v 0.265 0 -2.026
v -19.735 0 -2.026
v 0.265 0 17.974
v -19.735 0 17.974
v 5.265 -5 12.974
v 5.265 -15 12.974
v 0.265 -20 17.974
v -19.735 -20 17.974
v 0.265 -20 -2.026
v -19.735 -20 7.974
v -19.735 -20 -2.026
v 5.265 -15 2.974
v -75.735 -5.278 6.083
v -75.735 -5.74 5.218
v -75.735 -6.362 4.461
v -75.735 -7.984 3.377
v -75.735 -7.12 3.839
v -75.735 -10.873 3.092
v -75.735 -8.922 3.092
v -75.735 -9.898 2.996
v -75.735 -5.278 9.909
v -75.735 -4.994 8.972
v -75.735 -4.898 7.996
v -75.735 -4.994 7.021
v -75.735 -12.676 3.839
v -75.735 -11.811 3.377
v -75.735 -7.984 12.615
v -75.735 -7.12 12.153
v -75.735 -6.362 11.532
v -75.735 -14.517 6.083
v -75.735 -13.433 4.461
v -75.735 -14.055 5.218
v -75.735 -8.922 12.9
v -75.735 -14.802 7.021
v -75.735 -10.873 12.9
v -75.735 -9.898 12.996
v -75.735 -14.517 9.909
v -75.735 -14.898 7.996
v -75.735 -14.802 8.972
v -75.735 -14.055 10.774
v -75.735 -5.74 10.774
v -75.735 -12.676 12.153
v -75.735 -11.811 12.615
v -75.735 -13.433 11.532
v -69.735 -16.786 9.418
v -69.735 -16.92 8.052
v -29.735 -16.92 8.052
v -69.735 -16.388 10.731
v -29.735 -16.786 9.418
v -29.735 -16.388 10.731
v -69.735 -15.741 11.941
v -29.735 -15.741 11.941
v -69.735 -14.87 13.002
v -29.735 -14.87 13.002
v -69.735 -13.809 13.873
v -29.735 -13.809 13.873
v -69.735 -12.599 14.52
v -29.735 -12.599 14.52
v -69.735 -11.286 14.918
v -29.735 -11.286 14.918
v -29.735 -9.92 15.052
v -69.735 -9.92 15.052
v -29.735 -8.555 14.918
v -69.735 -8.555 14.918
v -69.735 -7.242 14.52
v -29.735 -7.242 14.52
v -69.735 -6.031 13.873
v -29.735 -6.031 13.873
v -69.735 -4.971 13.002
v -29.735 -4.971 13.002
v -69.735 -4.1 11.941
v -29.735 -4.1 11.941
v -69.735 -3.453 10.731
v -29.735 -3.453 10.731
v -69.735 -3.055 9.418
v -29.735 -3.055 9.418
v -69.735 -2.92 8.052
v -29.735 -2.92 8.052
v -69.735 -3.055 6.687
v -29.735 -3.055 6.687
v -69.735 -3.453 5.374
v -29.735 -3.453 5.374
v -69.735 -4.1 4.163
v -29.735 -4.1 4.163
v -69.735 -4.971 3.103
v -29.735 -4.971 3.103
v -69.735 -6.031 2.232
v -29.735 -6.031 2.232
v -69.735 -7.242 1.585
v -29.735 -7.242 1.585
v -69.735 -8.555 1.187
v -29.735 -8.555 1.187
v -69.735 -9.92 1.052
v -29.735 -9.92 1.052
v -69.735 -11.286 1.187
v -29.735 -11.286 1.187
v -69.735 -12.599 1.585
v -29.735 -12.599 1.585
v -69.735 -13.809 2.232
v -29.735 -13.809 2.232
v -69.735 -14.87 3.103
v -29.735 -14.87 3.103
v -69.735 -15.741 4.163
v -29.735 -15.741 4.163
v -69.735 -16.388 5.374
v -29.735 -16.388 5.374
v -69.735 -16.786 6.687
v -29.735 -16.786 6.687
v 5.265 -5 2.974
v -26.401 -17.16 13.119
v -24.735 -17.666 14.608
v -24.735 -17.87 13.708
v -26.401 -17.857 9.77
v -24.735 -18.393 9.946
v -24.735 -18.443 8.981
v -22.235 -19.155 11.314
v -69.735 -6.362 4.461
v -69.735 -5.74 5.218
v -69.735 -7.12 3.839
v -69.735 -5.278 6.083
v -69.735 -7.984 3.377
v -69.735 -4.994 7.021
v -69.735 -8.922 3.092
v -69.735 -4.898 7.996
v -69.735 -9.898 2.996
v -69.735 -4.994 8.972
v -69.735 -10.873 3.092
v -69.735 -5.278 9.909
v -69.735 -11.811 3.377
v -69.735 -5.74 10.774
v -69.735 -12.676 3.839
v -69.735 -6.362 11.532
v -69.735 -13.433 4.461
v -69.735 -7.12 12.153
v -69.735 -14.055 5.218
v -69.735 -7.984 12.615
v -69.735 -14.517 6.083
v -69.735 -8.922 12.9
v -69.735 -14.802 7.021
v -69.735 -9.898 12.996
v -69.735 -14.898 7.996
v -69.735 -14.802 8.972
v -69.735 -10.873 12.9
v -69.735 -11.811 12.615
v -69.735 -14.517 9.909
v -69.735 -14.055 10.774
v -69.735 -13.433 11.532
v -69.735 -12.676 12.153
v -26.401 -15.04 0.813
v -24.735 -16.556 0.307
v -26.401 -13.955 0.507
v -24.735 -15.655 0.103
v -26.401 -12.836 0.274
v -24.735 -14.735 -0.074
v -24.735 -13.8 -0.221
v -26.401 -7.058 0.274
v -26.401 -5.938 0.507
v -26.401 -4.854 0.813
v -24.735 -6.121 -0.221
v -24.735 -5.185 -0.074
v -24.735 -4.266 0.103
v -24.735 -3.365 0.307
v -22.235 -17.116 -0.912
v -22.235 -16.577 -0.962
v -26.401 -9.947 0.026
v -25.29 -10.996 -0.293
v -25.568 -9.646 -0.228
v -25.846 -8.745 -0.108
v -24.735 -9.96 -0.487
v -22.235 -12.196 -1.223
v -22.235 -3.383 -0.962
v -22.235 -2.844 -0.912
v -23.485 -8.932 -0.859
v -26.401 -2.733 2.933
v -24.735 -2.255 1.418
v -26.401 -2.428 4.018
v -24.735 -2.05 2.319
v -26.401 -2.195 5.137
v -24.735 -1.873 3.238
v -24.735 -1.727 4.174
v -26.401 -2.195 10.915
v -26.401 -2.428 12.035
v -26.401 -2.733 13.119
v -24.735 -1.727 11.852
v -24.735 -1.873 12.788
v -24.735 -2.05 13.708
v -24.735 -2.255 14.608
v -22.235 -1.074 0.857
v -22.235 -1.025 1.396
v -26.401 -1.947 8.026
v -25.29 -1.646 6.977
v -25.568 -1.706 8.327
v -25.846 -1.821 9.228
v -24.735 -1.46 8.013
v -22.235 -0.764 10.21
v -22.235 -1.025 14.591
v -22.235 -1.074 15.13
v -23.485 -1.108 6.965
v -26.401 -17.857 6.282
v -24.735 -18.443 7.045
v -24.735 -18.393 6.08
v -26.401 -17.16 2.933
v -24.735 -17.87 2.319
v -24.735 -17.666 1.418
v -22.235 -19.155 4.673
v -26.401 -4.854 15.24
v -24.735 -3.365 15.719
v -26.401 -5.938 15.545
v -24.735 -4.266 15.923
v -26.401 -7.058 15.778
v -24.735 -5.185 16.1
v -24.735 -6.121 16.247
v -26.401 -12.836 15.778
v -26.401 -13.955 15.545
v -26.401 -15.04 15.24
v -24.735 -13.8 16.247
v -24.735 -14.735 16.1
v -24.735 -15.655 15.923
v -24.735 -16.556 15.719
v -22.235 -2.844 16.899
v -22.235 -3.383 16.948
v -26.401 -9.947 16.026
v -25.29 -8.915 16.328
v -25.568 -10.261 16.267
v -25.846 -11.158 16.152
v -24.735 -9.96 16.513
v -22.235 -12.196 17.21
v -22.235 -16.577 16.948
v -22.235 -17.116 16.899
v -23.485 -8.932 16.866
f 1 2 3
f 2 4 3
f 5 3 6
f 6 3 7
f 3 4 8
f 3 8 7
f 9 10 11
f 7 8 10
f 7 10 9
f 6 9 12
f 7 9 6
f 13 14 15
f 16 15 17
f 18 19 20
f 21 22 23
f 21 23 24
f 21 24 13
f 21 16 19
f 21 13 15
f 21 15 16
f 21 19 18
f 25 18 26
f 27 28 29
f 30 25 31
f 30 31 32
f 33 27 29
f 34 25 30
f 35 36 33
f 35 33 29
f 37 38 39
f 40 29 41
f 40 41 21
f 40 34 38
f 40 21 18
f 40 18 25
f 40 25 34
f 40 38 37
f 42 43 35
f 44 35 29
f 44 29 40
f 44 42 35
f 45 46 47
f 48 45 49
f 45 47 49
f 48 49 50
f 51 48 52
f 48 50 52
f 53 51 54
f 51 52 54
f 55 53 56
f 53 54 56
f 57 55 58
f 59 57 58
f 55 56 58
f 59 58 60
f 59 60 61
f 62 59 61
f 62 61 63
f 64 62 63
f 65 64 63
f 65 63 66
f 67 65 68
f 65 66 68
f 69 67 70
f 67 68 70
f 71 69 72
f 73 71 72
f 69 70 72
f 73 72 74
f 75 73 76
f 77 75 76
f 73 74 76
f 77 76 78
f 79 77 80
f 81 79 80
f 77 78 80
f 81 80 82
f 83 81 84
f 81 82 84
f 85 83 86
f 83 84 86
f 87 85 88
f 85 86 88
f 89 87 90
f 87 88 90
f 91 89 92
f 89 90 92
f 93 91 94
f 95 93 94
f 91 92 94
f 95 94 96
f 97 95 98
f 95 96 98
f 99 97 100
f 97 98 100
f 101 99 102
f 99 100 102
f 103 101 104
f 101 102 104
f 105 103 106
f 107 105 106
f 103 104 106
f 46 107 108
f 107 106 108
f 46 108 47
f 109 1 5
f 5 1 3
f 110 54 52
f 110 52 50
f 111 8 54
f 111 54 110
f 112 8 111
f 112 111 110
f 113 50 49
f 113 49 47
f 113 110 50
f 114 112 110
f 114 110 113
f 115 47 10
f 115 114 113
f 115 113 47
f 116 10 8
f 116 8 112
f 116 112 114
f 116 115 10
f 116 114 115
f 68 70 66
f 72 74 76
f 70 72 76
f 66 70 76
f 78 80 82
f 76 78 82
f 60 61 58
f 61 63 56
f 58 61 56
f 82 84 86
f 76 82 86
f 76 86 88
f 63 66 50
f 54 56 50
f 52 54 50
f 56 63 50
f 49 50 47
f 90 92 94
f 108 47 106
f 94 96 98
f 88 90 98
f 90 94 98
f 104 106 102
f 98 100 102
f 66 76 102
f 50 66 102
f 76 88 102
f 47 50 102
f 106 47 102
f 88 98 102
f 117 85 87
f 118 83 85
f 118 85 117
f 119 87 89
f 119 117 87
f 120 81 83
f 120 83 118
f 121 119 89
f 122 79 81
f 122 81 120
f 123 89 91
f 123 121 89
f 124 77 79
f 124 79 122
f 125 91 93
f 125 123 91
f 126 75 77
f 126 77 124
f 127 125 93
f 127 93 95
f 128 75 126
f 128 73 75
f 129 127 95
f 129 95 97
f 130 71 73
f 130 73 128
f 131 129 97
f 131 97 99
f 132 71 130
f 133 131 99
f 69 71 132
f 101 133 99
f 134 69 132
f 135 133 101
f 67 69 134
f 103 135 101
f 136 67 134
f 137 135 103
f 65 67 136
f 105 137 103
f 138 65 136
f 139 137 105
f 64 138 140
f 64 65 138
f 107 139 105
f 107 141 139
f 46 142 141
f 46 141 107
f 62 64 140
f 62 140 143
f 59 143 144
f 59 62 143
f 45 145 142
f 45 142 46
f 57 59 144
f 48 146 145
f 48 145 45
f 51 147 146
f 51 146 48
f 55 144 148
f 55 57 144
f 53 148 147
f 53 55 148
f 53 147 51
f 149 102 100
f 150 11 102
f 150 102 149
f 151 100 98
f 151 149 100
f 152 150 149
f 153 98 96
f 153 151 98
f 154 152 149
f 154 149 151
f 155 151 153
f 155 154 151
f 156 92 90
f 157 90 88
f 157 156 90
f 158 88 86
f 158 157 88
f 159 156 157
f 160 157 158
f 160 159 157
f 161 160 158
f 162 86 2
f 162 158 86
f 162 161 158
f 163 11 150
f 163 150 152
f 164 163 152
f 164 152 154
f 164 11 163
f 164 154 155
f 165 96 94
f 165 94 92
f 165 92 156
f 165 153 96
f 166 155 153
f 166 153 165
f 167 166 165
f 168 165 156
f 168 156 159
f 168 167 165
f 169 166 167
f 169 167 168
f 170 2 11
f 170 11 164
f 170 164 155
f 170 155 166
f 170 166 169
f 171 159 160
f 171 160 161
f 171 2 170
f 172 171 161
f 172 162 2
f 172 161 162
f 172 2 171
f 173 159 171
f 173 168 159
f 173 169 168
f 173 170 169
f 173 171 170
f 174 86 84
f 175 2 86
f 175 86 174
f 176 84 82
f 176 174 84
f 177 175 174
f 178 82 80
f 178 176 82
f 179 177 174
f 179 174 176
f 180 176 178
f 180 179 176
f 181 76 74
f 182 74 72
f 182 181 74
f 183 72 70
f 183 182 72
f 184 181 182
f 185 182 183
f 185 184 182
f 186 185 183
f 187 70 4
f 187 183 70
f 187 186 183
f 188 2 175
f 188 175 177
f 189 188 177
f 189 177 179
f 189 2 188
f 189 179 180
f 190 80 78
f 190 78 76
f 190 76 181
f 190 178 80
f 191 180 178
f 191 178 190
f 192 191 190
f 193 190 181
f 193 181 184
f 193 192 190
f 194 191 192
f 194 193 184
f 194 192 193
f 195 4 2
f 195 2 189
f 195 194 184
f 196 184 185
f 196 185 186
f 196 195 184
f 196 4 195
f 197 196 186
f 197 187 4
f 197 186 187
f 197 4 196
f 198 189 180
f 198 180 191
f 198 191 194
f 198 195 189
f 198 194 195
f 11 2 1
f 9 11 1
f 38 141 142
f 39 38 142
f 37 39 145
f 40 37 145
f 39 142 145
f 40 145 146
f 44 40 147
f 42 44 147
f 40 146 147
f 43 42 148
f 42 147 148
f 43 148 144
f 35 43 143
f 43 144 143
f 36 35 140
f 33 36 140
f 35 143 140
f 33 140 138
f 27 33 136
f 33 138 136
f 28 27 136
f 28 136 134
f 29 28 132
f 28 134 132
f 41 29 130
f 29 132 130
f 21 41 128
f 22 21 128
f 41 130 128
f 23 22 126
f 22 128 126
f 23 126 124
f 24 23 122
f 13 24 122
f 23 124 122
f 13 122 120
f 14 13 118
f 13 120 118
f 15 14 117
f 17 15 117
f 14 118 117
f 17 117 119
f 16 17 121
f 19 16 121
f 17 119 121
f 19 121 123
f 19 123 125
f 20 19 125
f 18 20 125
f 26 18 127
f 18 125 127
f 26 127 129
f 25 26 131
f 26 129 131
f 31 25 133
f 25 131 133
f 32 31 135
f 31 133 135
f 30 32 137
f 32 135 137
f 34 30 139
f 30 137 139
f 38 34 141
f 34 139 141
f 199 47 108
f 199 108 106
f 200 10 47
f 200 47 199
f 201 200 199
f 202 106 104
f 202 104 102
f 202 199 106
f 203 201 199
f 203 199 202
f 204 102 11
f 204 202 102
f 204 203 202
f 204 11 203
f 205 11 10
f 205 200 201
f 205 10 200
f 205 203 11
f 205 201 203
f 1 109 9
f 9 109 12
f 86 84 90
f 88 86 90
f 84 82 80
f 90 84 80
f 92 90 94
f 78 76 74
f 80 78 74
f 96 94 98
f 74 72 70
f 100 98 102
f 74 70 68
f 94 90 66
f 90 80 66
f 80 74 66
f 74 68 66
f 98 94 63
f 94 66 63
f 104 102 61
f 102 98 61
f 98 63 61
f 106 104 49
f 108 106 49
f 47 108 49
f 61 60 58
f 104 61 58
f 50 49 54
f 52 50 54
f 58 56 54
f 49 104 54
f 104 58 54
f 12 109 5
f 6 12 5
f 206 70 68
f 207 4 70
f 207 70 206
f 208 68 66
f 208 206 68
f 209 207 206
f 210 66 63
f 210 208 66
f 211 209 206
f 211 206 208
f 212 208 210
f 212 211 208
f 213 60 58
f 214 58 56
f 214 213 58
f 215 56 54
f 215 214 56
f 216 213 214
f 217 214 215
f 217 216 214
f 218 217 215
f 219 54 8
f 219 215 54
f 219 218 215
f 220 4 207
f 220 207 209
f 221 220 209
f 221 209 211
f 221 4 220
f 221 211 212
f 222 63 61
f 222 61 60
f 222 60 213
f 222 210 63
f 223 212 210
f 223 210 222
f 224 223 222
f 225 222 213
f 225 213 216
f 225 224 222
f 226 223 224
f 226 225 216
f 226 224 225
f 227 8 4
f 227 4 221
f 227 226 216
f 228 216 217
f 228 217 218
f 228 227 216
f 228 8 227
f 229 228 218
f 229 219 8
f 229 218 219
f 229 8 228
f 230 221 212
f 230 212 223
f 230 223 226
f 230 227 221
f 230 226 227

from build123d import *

# Parameters (mm, degrees)
F0_W      = 25
F0_H      = 20
F1_DEPTH  = 20
F2_SIZE   = 5
F4_R      = 7
F5_DEPTH  = 40
F5_FACE_R = 7
F1_FACE_W = 20
F1_FACE_H = 20
F7_R      = 5
F8_DEPTH  = 6


with BuildPart() as f1:
    # F0 (on Front) → F1 (new body)
    with BuildSketch(Plane.XZ):
        with Locations((-7.2345635854, 7.9736135416)):
            Rectangle(F0_W, F0_H)
    extrude(amount=F1_DEPTH)

    # F2
    f2_edges = [f1.edges().sort_by_distance(p)[0] for p in [
        (5.265436, -10, -2.026386),
        (5.265436, -10, 17.973614),
        (5.265436, 0, 7.973614),
        (5.265436, -20, 7.973614),
    ]]
    chamfer(f2_edges, length=F2_SIZE)

    # F5_face (on face) → F6 section 0
    with BuildSketch(Plane(origin=(-29.7345635854, -9.920351565, 8.0523975194), x_dir=(0, -1, 0), z_dir=(1, 0, 0))):
        Circle(F5_FACE_R)
    # F1_face (on face) → F6 section 1
    with BuildSketch(Plane(origin=(-19.7345635854, -10, 7.9736135416), x_dir=(0, -1, 0), z_dir=(-1, 0, 0))):
        Rectangle(F1_FACE_W, F1_FACE_H)
    loft()


with BuildPart() as f5:
    # F4 (on offset) → F5 (new body)
    with BuildSketch(Plane(origin=(-29.7345635854, 0, 0), x_dir=(0, -1, 0), z_dir=(-1, 0, 0))):
        with Locations((9.920351565, 8.0523975194)):
            Circle(F4_R)
    extrude(amount=F5_DEPTH)

    # F7 (on face) → F8 (join)
    with BuildSketch(Plane(origin=(-69.7345635854, 0, 0), x_dir=(0, -1, 0), z_dir=(-1, 0, 0))):
        with Locations((9.8977517168, 7.9960664734)):
            Circle(F7_R)
    extrude(amount=F8_DEPTH)


solid = Compound([f1.part, f5.part])
